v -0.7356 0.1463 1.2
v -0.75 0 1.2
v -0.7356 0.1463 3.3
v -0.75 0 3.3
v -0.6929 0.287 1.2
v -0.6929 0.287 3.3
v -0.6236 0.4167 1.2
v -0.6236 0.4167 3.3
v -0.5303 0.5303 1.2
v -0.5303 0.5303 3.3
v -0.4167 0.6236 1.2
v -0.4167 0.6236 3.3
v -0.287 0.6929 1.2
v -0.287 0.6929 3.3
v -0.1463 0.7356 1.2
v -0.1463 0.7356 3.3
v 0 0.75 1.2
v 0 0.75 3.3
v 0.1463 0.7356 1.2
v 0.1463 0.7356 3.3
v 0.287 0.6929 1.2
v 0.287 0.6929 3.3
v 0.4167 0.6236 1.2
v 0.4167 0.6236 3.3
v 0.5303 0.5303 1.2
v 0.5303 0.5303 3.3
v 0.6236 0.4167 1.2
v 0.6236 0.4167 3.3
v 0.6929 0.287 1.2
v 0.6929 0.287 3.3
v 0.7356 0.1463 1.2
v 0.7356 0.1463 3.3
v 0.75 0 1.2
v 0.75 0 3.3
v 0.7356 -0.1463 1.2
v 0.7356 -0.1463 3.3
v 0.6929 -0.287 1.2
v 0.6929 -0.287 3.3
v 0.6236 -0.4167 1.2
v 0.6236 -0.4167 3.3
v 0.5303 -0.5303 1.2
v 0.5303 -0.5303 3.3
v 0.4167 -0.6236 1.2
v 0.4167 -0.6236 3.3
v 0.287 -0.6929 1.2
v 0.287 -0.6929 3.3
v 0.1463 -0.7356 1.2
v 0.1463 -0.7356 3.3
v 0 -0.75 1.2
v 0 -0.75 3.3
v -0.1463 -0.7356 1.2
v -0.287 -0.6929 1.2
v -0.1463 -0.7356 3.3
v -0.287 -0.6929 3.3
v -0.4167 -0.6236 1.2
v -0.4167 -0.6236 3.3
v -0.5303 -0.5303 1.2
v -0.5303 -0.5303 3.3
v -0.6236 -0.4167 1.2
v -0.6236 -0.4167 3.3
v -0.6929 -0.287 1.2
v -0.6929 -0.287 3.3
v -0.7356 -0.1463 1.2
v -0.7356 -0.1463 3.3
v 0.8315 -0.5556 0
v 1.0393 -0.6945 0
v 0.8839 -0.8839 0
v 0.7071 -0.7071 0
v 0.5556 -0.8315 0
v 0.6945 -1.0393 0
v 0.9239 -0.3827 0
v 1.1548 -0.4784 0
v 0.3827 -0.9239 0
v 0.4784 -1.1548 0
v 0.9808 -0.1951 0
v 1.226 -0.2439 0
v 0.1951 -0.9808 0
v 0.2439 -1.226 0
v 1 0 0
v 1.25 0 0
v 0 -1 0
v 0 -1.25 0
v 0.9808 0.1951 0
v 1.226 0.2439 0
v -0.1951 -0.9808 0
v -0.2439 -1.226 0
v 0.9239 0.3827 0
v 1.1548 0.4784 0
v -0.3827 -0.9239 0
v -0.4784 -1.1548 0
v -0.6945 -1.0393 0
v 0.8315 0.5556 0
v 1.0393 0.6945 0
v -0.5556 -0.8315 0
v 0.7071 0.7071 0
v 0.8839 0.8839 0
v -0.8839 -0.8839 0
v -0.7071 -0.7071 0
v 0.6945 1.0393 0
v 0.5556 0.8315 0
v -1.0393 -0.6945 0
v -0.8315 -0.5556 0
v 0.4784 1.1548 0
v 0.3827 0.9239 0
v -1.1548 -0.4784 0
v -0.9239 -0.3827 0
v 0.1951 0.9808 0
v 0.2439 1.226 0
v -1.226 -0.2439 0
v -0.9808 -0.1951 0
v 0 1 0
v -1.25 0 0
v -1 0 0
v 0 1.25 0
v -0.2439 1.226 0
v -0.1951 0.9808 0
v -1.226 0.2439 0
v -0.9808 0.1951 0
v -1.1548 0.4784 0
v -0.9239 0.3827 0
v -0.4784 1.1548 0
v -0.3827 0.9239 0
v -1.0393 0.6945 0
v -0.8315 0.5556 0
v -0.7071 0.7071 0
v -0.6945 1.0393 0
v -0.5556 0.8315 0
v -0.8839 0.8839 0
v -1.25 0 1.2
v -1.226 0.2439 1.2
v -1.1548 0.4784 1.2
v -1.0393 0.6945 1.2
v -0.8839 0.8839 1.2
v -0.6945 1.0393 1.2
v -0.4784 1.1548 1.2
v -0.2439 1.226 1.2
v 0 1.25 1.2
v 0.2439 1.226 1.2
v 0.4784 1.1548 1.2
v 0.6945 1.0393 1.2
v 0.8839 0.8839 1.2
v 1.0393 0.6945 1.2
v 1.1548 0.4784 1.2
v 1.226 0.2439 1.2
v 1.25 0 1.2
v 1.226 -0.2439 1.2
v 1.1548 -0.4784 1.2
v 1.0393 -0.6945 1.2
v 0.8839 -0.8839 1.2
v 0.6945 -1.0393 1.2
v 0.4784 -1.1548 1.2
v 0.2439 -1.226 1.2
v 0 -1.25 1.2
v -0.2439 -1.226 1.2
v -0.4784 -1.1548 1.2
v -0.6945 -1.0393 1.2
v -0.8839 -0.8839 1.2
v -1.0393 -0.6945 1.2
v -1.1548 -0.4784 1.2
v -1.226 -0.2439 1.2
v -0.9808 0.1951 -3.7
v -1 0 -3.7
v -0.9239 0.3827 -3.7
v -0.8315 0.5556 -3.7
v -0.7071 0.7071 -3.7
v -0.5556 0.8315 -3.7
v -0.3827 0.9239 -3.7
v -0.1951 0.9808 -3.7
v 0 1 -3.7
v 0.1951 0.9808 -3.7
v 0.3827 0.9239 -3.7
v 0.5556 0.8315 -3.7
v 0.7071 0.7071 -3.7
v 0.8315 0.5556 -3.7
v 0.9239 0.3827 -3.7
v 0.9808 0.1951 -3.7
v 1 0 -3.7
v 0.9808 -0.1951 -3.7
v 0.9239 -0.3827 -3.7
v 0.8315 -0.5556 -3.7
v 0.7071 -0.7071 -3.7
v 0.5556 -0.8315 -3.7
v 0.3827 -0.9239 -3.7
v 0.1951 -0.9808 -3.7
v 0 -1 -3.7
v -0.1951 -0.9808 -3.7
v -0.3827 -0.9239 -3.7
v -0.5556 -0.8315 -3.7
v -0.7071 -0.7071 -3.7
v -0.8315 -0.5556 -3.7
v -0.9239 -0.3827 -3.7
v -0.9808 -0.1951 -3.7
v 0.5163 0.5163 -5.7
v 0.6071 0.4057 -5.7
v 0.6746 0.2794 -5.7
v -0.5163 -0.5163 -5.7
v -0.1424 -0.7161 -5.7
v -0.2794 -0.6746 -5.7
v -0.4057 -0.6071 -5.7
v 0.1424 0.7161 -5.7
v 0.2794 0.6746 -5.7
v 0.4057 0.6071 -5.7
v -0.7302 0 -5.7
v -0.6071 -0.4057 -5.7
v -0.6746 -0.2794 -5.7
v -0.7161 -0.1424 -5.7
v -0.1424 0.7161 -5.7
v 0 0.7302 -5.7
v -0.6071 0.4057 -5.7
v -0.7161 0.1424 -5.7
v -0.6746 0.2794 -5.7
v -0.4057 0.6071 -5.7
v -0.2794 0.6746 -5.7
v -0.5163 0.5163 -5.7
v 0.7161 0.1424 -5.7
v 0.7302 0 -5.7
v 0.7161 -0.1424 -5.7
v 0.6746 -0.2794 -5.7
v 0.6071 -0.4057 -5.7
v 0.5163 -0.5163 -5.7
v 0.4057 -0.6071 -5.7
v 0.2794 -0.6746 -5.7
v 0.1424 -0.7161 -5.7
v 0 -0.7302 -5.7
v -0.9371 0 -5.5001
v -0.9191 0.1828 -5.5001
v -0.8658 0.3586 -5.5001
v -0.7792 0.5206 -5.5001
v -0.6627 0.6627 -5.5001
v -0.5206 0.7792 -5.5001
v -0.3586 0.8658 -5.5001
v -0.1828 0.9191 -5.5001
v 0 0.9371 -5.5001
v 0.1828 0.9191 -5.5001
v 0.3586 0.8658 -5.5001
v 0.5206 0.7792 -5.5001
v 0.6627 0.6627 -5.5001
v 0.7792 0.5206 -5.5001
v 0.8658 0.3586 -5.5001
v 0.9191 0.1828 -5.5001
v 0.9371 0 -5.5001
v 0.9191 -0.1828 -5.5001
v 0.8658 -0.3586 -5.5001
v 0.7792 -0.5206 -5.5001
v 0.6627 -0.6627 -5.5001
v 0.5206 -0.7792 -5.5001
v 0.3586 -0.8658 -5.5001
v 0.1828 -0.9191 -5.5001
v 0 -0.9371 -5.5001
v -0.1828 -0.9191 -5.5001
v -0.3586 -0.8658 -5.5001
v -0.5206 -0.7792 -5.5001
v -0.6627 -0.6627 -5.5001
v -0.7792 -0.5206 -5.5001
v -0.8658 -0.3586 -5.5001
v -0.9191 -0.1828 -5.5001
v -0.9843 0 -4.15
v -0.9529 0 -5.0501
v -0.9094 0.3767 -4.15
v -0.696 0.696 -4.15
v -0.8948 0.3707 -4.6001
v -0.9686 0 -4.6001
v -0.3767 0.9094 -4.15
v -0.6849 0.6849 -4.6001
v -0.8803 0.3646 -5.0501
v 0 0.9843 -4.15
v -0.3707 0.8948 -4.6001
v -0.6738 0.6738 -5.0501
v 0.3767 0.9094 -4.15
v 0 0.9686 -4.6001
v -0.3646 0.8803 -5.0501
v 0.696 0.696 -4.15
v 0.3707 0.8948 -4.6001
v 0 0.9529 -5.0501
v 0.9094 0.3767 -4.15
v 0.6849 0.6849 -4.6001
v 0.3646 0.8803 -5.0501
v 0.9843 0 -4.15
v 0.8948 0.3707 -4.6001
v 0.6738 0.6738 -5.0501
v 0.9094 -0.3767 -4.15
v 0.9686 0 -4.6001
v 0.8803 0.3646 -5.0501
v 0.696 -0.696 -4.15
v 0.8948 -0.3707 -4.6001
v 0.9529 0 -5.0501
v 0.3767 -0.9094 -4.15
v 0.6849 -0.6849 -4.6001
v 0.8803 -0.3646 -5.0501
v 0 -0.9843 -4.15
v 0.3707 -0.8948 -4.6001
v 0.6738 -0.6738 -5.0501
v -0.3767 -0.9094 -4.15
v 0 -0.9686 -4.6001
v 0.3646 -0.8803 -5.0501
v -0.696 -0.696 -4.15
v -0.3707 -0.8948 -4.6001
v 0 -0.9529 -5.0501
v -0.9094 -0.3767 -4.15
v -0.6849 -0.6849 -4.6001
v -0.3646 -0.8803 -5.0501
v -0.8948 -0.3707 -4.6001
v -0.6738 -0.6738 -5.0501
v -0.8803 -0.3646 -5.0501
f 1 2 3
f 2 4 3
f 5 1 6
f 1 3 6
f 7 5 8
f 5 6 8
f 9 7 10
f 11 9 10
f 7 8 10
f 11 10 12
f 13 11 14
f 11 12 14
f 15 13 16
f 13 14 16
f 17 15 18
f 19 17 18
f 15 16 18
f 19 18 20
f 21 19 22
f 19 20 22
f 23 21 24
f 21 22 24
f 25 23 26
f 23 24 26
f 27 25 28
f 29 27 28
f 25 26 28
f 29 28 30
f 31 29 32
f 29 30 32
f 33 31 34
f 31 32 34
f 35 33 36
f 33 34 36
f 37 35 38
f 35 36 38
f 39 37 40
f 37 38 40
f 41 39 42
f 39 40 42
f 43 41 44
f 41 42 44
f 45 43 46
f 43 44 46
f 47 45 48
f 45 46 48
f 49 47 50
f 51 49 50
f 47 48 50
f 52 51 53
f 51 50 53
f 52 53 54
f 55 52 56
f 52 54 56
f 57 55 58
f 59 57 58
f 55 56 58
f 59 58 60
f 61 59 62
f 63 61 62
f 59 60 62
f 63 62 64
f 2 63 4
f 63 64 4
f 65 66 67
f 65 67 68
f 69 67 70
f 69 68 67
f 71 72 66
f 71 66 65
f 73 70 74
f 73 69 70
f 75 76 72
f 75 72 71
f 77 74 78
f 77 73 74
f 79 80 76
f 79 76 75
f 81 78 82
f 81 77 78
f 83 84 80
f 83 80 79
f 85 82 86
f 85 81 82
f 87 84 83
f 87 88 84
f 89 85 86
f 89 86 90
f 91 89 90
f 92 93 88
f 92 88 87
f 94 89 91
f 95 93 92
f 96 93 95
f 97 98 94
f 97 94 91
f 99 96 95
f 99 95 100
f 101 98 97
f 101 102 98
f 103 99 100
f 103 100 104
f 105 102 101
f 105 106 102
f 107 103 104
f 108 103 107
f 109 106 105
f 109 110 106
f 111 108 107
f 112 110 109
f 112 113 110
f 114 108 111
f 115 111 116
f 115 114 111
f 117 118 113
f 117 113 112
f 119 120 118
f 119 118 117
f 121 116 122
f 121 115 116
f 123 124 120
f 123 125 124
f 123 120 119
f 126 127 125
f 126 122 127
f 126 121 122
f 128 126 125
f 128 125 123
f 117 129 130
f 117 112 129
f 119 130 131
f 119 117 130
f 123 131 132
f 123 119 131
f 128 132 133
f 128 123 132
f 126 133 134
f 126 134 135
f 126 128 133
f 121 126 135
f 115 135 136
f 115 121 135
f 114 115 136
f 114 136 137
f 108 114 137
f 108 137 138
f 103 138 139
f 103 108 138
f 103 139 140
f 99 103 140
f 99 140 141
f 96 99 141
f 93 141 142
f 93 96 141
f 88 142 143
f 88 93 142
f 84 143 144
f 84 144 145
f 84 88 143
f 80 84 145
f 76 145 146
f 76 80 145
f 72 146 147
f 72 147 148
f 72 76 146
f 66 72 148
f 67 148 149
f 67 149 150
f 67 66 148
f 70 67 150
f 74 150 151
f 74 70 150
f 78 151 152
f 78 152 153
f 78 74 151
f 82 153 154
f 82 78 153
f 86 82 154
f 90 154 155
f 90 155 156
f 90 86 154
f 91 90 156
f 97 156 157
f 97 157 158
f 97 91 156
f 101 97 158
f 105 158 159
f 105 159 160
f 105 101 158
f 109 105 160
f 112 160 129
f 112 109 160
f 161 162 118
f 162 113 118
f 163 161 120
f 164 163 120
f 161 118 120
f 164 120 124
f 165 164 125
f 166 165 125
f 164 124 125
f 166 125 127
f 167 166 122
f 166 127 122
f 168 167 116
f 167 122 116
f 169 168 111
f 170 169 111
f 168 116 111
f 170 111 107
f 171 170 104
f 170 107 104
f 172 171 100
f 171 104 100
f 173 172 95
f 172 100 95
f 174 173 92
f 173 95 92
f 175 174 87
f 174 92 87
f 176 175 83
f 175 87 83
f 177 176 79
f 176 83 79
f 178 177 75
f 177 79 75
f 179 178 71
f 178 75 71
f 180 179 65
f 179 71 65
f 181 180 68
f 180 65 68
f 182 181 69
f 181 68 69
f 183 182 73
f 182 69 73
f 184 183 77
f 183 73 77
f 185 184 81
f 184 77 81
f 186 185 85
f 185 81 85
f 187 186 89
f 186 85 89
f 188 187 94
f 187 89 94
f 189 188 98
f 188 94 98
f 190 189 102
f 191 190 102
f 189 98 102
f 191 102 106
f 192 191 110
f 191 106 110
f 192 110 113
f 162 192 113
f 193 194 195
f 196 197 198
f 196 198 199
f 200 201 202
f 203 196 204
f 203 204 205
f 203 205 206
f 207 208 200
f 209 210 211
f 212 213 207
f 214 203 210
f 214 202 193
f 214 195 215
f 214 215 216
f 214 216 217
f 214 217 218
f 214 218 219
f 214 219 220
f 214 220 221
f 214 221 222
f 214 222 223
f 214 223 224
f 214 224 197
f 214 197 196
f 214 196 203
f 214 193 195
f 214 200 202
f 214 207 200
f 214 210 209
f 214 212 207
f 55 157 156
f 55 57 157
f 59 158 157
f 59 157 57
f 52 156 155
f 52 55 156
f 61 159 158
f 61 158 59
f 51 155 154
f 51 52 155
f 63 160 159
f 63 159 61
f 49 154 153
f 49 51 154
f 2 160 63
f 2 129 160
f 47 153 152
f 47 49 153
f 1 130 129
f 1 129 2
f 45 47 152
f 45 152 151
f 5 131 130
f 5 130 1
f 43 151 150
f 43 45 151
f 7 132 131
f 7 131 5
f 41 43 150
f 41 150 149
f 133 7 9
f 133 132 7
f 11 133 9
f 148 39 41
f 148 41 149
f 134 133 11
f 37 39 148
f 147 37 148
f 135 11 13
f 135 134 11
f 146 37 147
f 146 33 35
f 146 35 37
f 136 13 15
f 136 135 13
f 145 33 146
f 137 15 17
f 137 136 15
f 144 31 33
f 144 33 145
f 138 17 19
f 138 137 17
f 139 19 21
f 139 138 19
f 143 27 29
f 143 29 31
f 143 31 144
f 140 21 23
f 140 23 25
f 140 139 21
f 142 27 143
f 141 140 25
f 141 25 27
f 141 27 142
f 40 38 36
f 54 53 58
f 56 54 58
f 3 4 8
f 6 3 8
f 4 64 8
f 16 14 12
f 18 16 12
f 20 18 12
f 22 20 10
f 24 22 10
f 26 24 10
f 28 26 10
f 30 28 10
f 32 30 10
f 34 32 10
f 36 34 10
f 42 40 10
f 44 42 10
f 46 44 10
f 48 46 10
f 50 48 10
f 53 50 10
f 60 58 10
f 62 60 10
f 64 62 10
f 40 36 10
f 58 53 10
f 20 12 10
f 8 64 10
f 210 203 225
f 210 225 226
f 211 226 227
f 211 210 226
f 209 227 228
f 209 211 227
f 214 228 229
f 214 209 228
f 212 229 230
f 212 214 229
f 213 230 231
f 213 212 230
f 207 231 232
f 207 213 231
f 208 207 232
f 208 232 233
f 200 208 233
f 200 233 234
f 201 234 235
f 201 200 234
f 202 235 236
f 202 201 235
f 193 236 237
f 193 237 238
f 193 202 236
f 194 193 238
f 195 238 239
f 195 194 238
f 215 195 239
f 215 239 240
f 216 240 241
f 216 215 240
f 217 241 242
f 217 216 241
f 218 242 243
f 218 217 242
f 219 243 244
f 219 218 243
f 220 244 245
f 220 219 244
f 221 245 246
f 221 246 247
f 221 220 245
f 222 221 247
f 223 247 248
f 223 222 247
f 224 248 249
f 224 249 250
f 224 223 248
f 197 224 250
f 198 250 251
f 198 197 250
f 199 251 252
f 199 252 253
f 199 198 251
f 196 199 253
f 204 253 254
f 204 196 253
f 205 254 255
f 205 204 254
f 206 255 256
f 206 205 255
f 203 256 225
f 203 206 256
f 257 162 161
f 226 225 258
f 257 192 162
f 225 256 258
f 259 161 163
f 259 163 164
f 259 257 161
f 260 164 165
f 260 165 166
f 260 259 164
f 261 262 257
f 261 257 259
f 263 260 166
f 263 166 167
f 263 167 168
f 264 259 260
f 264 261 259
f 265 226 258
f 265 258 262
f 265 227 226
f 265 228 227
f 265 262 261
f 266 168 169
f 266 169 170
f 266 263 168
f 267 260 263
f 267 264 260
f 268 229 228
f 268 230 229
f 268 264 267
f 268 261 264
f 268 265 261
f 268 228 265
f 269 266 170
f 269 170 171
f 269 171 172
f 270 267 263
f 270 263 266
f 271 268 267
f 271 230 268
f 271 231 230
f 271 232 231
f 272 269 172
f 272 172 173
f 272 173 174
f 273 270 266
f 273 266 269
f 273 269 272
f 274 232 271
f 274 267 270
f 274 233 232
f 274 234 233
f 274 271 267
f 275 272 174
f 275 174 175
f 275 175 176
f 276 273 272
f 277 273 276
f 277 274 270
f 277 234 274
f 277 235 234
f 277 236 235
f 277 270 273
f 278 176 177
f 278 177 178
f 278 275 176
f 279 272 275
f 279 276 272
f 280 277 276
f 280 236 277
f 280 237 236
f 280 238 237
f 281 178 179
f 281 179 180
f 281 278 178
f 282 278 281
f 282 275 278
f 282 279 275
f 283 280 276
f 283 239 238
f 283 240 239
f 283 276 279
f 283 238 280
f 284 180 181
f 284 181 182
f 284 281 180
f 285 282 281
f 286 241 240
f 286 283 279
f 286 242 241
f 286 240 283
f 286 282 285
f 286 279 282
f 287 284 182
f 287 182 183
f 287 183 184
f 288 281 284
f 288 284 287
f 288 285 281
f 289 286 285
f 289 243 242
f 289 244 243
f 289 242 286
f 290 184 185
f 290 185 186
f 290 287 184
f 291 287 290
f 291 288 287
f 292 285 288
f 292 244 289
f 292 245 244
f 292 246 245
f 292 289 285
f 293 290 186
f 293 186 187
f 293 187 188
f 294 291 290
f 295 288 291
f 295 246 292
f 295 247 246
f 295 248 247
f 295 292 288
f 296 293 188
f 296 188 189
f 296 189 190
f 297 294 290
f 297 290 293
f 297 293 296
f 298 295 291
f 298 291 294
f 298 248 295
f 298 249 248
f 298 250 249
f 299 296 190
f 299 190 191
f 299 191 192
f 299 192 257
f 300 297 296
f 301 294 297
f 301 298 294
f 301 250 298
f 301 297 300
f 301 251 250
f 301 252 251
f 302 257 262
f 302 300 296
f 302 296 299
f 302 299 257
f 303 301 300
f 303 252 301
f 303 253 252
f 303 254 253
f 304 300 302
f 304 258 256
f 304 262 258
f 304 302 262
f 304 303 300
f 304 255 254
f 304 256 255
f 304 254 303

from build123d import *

# Parameters (mm, degrees)
F0_W    = 0.75
F0_H    = 2.1
F0_W_2  = 1
F0_H_2  = 3.7
F2_SIZE = 0.2


with BuildPart() as f1:
    # F0 (on Front) → F1 (revolve)
    with BuildSketch(Plane.XZ):
        with Locations((-0.375, 2.25)):
            Rectangle(F0_W, F0_H)
        Polygon((-1.25, 1.2), (-1.25, 0), (-1, 0), (0, 0), (0, 1.2), (-0.75, 1.2), align=None)
        with Locations((-0.5, -1.85)):
            Rectangle(F0_W_2, F0_H_2)
        Polygon((0, -3.7), (-1, -3.7), (-0.930158, -5.7), (0, -5.7), align=None)
    revolve(axis=Axis((0, 0, -1.2), (0, 0, -1)))

    # F2
    f2_edges = [f1.edges().sort_by_distance(p)[0] for p in [
        (0.930158, 0, -5.7),
    ]]
    chamfer(f2_edges, length=F2_SIZE)


solid = f1.part
